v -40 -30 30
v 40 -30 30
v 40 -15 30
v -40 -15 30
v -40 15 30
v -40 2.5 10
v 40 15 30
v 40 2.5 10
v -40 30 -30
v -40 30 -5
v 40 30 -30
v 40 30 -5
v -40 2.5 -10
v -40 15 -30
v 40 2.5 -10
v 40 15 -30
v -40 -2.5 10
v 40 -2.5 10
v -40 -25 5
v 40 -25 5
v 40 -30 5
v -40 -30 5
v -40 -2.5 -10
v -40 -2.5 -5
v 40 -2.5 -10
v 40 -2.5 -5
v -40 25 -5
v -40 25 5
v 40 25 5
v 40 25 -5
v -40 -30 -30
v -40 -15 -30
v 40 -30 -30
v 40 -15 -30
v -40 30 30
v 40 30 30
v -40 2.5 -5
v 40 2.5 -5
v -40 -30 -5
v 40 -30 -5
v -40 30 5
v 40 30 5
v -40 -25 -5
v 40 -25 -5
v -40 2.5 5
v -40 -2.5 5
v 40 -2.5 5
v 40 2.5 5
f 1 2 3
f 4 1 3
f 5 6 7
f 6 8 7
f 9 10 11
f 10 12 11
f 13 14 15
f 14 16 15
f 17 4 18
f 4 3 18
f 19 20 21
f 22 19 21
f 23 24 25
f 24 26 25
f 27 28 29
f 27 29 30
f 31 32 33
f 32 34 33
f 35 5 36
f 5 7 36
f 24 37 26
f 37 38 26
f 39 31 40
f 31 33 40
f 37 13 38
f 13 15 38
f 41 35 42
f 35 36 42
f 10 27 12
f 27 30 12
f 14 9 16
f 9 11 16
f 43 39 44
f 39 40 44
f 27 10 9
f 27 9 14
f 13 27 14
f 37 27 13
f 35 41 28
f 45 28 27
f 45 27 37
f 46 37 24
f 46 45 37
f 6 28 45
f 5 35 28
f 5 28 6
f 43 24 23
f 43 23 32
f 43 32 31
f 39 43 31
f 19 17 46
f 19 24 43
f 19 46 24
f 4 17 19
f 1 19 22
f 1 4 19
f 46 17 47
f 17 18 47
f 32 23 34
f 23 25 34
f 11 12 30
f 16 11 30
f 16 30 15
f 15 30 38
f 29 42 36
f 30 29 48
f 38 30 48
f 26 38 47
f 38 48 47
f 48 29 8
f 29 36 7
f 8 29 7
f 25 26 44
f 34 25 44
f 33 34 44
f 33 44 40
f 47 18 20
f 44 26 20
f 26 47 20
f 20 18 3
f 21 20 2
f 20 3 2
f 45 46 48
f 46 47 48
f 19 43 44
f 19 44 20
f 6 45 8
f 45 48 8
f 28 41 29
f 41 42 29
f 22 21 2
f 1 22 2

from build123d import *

# Parameters (mm, degrees)
BOSS_EXTRUDE1_DEPTH = 40


with BuildPart() as part:
    # Sketch1 → Boss-Extrude1 (new, symmetric)
    with BuildSketch(Plane.YZ):
        Polygon((-30, 30), (-15, 30), (-2.5, 10), (-2.5, 5), (2.5, 5), (2.5, 10), (15, 30), (30, 30), (30, 5), (25, 5), (25, -5), (30, -5), (30, -30), (15, -30), (2.5, -10), (2.5, -5), (-2.5, -5), (-2.5, -10), (-15, -30), (-30, -30), (-30, -5), (-25, -5), (-25, 5), (-30, 5), align=None)
    extrude(amount=BOSS_EXTRUDE1_DEPTH, both=True)


solid = part.part
